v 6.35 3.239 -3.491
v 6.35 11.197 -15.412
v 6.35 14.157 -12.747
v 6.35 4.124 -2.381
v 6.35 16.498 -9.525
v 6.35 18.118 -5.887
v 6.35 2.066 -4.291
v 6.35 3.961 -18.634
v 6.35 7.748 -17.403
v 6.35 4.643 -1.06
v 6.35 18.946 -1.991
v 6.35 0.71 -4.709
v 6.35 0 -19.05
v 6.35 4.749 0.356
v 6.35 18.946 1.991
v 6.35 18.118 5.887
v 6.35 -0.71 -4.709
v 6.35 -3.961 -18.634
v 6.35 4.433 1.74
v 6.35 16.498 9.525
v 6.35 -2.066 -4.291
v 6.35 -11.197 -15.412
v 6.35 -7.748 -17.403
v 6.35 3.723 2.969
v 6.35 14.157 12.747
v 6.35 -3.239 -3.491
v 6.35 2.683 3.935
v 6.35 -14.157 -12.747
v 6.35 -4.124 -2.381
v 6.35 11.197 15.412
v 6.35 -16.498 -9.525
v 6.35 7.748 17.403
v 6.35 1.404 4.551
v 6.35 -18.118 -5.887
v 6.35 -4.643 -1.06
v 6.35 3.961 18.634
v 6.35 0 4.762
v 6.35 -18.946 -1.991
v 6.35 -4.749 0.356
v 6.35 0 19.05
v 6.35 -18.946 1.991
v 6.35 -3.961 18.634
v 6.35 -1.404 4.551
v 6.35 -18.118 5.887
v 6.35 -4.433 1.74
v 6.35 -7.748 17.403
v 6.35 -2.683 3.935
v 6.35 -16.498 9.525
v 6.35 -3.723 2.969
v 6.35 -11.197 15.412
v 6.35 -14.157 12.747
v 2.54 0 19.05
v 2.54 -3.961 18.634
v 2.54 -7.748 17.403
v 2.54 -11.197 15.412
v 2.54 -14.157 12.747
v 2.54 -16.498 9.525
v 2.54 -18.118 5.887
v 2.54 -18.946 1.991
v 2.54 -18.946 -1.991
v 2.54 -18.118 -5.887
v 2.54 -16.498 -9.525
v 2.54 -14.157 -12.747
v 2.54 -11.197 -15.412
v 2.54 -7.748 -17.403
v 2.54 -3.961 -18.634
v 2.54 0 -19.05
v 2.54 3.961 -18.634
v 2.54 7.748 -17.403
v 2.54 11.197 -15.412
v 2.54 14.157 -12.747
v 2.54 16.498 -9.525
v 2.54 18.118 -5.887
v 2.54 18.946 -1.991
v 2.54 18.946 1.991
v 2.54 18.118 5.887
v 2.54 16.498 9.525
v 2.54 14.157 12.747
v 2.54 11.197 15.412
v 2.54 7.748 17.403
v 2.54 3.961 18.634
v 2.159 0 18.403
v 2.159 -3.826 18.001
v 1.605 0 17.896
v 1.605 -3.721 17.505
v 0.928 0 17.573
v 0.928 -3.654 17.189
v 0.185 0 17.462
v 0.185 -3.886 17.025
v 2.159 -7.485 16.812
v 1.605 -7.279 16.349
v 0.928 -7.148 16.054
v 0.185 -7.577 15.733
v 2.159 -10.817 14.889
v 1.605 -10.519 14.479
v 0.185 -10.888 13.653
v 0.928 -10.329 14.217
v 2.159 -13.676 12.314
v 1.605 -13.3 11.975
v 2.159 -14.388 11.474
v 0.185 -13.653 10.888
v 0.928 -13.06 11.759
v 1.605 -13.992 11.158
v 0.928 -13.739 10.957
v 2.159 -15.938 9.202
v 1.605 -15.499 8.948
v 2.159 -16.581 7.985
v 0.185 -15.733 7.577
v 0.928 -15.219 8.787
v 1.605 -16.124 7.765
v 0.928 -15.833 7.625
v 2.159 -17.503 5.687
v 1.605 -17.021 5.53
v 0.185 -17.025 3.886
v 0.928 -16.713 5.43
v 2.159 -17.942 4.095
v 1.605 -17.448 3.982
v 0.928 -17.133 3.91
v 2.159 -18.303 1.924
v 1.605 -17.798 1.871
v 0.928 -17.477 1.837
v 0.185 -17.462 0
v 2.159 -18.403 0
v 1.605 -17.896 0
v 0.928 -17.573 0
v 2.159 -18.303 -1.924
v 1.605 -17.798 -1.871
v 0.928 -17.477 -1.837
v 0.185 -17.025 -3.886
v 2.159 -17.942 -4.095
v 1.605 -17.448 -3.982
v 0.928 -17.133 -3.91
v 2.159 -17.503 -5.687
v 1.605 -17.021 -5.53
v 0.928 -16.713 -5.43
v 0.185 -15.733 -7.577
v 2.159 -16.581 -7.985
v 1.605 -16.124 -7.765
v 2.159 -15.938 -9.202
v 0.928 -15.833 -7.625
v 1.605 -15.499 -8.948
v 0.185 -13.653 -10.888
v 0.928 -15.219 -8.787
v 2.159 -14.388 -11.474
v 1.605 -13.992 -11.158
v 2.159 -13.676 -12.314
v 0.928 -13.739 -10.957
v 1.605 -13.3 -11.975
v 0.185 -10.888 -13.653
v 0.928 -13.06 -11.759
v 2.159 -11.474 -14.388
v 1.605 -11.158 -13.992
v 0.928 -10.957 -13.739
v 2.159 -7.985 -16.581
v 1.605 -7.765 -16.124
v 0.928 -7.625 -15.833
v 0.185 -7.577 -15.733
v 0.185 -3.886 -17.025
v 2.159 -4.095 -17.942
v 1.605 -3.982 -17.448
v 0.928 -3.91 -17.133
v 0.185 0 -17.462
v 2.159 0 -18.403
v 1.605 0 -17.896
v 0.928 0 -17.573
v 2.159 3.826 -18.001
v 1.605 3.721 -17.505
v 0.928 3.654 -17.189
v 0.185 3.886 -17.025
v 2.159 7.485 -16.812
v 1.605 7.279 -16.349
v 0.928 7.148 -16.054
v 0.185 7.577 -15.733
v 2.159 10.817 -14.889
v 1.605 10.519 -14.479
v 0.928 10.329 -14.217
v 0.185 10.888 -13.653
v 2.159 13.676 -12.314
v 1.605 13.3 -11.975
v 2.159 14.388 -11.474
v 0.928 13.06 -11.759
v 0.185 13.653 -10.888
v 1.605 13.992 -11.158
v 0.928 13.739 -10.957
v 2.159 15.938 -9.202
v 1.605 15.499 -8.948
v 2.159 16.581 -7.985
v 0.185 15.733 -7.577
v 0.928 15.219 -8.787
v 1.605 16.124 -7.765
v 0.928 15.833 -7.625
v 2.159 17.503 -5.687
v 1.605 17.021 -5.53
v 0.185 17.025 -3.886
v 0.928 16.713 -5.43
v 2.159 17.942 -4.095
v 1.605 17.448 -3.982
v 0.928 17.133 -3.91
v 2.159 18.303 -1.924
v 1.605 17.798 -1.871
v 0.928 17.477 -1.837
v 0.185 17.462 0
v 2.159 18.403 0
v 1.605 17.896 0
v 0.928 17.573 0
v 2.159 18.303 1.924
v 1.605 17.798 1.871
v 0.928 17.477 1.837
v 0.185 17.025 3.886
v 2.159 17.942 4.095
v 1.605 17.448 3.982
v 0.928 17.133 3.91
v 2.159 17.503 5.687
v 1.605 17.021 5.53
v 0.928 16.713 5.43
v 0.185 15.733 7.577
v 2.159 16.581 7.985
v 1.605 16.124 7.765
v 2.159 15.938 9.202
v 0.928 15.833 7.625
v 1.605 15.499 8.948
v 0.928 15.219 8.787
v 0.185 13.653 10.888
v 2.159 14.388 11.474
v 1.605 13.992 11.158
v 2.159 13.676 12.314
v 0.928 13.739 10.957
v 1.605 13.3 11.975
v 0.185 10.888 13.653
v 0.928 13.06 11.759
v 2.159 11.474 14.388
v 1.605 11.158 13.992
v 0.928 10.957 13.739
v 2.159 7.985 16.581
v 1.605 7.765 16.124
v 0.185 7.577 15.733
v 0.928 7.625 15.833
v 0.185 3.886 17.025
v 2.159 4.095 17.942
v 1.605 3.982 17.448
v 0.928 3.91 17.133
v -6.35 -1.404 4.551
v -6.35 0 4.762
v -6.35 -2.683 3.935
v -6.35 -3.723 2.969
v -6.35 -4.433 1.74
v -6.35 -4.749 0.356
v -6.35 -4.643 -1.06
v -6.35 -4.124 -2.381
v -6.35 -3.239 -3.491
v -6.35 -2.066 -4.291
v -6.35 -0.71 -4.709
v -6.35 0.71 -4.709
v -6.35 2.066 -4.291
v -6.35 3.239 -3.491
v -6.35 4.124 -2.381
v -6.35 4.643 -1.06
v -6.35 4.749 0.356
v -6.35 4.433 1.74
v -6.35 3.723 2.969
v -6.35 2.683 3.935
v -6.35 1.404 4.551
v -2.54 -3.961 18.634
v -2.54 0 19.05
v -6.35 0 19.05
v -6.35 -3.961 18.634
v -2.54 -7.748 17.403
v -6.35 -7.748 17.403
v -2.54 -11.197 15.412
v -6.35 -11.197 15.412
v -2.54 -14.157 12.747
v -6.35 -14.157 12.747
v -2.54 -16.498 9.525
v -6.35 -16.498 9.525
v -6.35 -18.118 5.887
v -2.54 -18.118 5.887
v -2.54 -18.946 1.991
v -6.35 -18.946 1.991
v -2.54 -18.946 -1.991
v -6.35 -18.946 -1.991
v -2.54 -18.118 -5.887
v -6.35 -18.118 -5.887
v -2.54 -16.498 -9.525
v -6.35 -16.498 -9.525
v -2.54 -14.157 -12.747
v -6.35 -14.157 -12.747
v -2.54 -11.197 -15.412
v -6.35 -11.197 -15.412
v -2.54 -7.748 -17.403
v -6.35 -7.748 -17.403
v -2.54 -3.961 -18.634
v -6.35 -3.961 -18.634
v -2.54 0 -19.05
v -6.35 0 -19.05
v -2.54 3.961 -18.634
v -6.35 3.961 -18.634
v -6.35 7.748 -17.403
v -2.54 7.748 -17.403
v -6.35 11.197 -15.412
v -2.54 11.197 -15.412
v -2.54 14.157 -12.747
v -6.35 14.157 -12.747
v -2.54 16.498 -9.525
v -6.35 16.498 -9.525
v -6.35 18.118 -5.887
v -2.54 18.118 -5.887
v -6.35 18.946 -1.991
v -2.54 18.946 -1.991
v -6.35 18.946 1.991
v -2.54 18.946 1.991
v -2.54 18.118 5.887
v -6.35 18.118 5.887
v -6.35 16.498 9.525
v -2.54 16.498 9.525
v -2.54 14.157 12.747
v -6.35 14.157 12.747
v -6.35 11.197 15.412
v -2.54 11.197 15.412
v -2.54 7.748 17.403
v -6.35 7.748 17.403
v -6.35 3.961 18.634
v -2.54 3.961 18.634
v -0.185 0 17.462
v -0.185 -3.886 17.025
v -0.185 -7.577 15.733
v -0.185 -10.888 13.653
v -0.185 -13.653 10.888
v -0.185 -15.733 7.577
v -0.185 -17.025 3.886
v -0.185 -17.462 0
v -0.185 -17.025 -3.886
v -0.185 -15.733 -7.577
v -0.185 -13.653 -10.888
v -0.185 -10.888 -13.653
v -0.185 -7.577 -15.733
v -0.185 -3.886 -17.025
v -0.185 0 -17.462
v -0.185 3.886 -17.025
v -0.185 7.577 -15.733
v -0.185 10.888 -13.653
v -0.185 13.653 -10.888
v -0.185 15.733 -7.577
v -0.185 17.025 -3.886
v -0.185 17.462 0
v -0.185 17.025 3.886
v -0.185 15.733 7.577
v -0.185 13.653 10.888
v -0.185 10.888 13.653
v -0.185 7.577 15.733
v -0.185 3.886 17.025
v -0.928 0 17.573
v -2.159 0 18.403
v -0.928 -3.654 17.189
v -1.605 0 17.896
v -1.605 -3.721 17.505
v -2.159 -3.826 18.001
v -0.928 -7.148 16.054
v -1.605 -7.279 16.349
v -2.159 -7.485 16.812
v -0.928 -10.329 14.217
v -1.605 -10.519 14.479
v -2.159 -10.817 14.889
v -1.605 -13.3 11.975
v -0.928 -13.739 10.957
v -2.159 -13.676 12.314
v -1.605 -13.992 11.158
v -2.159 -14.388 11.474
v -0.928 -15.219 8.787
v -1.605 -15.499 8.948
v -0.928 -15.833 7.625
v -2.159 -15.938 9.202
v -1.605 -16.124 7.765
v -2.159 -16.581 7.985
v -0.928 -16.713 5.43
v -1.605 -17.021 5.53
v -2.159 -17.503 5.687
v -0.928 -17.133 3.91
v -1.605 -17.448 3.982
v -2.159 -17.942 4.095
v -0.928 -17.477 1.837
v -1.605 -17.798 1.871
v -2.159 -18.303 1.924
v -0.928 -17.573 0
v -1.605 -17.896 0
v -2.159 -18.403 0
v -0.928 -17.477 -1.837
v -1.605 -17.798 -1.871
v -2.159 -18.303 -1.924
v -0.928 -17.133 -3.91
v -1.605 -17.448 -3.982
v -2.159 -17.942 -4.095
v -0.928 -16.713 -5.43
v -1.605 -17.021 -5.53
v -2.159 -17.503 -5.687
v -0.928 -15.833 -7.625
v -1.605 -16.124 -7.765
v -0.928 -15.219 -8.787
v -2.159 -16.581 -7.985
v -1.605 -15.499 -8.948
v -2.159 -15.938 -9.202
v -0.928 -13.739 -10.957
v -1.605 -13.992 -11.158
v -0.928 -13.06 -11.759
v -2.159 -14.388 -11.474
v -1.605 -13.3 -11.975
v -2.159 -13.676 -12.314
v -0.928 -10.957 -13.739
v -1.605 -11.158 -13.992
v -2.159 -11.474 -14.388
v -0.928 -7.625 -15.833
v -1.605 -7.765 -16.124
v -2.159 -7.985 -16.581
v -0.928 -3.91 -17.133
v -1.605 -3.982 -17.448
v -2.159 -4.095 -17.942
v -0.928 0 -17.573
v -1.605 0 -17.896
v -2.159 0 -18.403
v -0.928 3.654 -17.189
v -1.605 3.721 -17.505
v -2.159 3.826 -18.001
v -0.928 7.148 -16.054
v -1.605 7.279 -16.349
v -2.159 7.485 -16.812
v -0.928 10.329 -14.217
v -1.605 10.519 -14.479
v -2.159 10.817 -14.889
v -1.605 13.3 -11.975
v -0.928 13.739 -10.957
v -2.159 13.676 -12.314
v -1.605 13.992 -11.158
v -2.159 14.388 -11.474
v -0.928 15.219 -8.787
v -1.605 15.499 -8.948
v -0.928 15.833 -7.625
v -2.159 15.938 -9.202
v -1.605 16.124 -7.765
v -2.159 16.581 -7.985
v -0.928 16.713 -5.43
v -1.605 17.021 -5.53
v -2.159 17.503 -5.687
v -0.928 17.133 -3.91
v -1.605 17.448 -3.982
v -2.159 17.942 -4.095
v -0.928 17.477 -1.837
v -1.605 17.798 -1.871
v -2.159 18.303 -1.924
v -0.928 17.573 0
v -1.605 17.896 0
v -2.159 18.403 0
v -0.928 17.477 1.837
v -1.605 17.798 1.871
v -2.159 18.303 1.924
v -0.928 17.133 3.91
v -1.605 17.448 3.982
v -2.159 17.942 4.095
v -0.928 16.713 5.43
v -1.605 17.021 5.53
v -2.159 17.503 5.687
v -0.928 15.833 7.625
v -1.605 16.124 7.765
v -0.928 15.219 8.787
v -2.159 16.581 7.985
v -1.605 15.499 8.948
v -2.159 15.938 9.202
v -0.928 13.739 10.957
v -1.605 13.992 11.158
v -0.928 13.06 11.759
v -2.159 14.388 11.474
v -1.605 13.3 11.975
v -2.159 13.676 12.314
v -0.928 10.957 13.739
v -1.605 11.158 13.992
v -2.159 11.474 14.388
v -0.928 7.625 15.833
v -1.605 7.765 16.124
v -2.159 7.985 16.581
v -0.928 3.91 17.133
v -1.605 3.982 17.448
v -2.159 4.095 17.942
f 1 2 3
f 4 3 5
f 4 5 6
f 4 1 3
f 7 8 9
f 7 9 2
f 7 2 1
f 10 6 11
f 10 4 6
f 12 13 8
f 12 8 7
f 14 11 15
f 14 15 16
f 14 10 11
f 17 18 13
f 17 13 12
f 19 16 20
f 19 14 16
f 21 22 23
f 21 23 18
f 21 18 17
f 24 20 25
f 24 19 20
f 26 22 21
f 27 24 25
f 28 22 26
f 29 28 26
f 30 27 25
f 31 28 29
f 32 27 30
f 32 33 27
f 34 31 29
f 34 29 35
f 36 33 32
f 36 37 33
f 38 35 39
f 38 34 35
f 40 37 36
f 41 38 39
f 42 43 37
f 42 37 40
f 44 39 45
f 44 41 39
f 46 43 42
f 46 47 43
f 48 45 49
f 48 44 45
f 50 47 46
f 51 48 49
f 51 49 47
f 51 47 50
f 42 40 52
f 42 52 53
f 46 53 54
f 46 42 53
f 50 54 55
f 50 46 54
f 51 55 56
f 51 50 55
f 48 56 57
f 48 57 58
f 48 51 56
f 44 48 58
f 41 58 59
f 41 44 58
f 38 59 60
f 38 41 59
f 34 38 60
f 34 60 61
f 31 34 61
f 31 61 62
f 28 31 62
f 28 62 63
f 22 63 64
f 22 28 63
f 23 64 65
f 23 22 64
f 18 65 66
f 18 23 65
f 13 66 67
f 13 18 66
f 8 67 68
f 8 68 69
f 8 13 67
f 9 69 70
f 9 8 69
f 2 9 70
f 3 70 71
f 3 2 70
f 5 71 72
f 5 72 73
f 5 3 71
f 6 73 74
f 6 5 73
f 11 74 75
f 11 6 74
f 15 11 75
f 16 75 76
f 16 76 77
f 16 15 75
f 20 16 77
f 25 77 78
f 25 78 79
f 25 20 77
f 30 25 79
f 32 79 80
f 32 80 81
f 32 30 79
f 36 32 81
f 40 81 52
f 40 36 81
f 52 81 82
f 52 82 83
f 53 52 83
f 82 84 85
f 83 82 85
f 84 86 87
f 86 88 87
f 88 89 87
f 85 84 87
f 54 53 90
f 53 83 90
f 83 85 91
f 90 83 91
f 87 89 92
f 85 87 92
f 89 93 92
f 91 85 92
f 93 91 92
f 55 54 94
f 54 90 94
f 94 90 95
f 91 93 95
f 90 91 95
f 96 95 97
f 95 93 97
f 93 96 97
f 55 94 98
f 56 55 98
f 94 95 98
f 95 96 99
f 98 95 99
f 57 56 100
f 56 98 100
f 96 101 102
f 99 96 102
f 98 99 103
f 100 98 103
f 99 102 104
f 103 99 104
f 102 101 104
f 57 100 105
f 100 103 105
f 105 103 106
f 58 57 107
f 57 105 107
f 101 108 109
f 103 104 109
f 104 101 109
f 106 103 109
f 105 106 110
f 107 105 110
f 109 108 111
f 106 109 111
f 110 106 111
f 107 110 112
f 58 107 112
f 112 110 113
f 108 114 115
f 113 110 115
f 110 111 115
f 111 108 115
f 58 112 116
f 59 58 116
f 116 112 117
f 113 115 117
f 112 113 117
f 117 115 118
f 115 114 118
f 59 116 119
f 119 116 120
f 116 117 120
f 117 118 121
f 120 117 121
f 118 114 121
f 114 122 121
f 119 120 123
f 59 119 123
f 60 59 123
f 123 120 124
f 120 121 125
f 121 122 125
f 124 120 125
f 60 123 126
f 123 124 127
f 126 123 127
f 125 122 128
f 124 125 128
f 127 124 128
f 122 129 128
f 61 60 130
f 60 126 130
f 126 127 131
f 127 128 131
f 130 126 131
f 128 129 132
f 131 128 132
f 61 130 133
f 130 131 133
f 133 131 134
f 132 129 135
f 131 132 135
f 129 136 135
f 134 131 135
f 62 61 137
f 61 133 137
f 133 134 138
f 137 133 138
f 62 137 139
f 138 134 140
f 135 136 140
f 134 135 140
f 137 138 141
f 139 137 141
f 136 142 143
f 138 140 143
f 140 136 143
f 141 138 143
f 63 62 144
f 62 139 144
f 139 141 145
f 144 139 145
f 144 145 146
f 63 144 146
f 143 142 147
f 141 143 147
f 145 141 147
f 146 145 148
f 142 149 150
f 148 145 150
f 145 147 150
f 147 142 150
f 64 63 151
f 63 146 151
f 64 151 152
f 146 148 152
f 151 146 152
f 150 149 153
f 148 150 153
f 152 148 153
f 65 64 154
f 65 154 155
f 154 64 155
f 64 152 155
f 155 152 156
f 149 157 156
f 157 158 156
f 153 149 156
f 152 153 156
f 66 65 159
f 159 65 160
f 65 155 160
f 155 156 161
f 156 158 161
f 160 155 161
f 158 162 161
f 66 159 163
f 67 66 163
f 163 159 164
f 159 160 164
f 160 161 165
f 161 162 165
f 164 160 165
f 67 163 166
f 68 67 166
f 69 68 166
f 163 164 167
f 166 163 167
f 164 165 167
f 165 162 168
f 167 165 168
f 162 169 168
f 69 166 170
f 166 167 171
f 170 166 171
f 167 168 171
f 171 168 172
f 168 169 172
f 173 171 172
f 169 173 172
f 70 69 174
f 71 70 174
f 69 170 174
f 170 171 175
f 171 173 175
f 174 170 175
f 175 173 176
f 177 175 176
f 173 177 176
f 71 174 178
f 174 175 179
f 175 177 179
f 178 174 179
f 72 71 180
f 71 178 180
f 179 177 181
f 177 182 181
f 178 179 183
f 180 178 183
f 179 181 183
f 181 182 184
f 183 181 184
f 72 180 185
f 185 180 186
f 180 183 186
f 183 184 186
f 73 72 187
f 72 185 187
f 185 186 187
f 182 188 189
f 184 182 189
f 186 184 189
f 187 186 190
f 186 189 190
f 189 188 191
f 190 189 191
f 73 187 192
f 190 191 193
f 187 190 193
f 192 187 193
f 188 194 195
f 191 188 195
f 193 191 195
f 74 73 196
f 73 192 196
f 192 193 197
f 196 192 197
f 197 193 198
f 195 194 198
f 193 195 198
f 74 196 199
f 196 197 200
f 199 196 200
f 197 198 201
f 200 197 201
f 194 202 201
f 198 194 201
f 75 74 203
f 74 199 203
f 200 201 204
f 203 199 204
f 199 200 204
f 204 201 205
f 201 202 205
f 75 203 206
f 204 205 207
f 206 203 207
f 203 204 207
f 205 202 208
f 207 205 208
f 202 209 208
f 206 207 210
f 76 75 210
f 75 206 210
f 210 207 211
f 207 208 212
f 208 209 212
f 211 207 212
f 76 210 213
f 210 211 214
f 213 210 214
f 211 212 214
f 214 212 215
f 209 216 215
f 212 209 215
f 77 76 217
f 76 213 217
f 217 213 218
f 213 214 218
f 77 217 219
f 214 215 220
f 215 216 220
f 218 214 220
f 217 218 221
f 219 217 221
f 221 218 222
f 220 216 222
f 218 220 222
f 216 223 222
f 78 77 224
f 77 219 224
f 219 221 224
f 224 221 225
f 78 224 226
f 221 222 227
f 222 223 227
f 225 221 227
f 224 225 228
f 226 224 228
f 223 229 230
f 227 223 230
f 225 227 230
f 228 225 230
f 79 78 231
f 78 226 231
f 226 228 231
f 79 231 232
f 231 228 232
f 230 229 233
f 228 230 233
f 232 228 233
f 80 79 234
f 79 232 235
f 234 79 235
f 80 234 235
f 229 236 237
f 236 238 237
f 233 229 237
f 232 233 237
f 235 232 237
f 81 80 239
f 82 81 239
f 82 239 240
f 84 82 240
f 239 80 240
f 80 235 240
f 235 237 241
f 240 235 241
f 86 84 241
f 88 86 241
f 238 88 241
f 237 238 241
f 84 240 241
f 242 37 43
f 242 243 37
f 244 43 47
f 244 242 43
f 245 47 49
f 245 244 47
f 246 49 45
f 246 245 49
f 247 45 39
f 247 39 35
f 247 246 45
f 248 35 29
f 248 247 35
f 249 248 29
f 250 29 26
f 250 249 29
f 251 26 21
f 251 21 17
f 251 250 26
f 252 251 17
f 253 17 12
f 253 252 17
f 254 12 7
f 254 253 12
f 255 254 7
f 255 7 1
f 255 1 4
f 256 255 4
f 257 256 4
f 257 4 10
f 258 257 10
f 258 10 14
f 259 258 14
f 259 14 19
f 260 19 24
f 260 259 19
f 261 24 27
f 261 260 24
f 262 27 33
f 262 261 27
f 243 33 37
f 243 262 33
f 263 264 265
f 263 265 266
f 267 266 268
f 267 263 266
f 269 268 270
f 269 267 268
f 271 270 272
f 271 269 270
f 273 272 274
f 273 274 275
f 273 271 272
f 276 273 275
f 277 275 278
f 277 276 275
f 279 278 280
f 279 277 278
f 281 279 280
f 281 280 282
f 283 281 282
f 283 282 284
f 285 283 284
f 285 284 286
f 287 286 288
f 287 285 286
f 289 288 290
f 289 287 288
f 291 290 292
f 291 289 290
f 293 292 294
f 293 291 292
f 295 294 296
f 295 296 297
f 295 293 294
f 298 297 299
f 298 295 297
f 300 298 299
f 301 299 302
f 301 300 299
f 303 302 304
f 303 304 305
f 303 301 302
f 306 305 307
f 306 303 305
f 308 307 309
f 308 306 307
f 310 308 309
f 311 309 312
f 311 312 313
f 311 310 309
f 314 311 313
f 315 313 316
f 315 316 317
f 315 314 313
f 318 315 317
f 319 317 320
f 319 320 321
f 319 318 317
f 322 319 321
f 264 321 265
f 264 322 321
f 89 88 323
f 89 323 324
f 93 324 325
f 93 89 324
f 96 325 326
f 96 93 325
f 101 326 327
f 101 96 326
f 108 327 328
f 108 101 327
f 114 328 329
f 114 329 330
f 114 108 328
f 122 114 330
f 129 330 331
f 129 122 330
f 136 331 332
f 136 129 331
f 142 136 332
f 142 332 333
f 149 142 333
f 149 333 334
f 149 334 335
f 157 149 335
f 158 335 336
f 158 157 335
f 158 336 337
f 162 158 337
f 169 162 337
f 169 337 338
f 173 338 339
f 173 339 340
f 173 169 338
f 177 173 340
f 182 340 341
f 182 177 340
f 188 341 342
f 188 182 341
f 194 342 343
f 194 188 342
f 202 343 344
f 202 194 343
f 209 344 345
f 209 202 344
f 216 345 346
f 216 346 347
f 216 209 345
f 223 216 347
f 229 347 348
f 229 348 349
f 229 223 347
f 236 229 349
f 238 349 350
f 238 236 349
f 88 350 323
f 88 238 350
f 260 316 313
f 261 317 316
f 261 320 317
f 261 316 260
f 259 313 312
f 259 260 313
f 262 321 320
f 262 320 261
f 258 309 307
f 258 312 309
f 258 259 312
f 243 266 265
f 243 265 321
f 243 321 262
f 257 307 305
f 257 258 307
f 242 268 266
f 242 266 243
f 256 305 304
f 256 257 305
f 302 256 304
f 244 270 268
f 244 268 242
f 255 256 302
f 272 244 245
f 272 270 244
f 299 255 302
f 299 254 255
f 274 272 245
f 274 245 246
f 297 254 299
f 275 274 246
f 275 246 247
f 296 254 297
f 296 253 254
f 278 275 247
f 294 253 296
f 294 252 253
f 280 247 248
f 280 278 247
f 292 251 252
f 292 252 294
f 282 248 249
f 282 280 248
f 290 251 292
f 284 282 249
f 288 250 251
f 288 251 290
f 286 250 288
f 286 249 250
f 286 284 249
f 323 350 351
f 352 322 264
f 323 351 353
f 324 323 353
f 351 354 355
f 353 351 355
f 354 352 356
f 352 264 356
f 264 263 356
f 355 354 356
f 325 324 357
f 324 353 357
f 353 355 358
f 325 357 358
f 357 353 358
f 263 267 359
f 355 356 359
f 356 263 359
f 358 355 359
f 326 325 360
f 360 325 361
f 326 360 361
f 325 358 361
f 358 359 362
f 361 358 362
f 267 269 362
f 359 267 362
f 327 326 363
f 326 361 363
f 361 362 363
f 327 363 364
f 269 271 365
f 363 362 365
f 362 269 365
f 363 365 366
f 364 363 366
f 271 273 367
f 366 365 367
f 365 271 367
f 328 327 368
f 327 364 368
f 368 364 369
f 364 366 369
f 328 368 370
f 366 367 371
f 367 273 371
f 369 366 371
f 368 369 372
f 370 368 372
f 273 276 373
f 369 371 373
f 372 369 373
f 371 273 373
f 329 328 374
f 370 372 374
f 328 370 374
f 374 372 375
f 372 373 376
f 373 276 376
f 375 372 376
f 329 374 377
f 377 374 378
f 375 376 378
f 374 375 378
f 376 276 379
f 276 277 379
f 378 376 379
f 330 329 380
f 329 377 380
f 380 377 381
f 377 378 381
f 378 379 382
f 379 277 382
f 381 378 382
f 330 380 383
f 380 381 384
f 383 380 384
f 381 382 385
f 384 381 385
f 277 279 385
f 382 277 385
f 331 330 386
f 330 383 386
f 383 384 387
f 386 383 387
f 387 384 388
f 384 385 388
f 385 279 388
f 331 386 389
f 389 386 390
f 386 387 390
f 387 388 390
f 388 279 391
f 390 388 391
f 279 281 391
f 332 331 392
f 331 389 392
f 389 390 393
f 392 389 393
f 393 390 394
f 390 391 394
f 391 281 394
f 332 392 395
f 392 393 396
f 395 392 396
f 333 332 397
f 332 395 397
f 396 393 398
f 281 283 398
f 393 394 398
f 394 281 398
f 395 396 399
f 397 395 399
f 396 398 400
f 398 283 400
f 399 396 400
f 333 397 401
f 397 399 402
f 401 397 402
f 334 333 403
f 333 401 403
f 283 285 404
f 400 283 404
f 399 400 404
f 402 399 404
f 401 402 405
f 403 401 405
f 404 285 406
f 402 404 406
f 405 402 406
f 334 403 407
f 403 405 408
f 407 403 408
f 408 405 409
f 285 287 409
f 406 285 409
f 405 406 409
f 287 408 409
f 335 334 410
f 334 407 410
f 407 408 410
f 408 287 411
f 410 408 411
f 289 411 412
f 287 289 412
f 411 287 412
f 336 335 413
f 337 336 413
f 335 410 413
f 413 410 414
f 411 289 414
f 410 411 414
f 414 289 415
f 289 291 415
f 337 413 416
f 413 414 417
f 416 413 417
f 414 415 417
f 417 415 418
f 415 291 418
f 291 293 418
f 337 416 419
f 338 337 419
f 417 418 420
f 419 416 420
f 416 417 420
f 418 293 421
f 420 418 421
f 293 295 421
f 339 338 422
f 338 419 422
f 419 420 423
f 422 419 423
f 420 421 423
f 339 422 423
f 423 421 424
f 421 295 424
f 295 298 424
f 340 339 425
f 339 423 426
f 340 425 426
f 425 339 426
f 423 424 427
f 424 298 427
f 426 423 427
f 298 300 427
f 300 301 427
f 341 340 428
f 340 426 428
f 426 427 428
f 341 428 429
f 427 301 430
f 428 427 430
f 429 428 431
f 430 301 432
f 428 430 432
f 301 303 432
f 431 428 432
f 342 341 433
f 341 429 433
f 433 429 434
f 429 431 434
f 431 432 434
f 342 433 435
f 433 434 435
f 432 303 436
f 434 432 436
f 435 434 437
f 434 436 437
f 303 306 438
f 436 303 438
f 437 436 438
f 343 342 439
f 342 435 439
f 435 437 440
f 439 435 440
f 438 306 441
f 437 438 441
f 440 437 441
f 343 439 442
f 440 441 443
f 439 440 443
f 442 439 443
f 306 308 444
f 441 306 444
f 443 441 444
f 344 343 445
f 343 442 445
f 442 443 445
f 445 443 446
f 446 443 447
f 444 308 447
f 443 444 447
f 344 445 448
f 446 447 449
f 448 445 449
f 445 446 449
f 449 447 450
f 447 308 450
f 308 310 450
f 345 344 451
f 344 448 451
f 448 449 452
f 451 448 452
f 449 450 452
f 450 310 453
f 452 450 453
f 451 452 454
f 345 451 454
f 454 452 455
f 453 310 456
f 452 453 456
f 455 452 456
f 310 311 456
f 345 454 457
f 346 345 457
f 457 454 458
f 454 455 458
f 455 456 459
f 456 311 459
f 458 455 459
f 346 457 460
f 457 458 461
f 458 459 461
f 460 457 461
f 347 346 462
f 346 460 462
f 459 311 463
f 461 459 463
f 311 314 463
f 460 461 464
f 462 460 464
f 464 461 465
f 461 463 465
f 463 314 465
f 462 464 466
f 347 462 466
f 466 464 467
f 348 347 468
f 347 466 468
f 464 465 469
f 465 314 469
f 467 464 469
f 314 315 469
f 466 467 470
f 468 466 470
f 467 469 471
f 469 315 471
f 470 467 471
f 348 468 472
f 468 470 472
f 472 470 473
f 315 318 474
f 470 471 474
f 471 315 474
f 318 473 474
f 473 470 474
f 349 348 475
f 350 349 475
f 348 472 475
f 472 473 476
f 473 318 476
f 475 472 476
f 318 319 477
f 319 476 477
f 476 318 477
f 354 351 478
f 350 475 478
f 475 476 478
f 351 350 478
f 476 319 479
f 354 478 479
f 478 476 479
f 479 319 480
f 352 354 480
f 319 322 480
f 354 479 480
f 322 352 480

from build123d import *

# Parameters (mm, degrees)
FILLET1_R = 2.54


with BuildPart() as part:
    # Sketch1 → Revolve1 (revolve)
    with BuildSketch(Plane.XY, mode=Mode.PRIVATE) as revolve1_sk:
        Polygon((6.35, 4.7625), (-6.35, 4.7625), (-6.35, 19.05), (-2.54, 19.05), (-2.54, 17.4625), (2.54, 17.4625), (2.54, 19.05), (6.35, 19.05), align=None)
    revolve(revolve1_sk.sketch.rotate(Axis((-4.187009613, 0, 0), (1, 0, 0)), 90), axis=Axis((-4.187009613, 0, 0), (1, 0, 0)))

    # Fillet1
    # the kernel refuses this fillet: 2.54 mm, written as the material it adds along each edge
    with BuildSketch(Plane(origin=(-2.54, 0, 0), x_dir=(0, 0, 1), z_dir=(0, 1, 0))) as fillet1_piece_1:
        with BuildLine():
            CenterArc((20.0025, 2.35464302), FILLET1_R, 180, 67.975687163)
            Line((17.4625, 2.35464302), (17.4117, 2.35464302))
            Line((17.4117, 2.35464302), (17.4117, 0))
            Line((17.4117, 0), (17.4625, -0.0508))
            ThreePointArc((17.4625, -0.0508), (18.25625, -0.0508), (19.03095, -0.04709286))
            Line((19.03095, -0.04709286), (19.05, 0))
        make_face()
    revolve(axis=Axis((-2.54, 0, 0), (1, 0, 0)))
    with BuildSketch(Plane(origin=(2.54, 0, 0), x_dir=(0, 0, 1), z_dir=(0, 1, 0))) as fillet1_piece_2:
        with BuildLine():
            CenterArc((20.0025, -2.35464302), FILLET1_R, 112.024312837, 67.975687163)
            Line((19.05, 0), (19.03095, 0.04709286))
            ThreePointArc((19.03095, 0.04709286), (18.25625, 0.0508), (17.4625, 0.0508))
            Line((17.4625, 0.0508), (17.4117, 0))
            Line((17.4117, 0), (17.4117, -2.35464302))
            Line((17.4117, -2.35464302), (17.4625, -2.35464302))
        make_face()
    revolve(axis=Axis((2.54, 0, 0), (1, 0, 0)))


solid = part.part
